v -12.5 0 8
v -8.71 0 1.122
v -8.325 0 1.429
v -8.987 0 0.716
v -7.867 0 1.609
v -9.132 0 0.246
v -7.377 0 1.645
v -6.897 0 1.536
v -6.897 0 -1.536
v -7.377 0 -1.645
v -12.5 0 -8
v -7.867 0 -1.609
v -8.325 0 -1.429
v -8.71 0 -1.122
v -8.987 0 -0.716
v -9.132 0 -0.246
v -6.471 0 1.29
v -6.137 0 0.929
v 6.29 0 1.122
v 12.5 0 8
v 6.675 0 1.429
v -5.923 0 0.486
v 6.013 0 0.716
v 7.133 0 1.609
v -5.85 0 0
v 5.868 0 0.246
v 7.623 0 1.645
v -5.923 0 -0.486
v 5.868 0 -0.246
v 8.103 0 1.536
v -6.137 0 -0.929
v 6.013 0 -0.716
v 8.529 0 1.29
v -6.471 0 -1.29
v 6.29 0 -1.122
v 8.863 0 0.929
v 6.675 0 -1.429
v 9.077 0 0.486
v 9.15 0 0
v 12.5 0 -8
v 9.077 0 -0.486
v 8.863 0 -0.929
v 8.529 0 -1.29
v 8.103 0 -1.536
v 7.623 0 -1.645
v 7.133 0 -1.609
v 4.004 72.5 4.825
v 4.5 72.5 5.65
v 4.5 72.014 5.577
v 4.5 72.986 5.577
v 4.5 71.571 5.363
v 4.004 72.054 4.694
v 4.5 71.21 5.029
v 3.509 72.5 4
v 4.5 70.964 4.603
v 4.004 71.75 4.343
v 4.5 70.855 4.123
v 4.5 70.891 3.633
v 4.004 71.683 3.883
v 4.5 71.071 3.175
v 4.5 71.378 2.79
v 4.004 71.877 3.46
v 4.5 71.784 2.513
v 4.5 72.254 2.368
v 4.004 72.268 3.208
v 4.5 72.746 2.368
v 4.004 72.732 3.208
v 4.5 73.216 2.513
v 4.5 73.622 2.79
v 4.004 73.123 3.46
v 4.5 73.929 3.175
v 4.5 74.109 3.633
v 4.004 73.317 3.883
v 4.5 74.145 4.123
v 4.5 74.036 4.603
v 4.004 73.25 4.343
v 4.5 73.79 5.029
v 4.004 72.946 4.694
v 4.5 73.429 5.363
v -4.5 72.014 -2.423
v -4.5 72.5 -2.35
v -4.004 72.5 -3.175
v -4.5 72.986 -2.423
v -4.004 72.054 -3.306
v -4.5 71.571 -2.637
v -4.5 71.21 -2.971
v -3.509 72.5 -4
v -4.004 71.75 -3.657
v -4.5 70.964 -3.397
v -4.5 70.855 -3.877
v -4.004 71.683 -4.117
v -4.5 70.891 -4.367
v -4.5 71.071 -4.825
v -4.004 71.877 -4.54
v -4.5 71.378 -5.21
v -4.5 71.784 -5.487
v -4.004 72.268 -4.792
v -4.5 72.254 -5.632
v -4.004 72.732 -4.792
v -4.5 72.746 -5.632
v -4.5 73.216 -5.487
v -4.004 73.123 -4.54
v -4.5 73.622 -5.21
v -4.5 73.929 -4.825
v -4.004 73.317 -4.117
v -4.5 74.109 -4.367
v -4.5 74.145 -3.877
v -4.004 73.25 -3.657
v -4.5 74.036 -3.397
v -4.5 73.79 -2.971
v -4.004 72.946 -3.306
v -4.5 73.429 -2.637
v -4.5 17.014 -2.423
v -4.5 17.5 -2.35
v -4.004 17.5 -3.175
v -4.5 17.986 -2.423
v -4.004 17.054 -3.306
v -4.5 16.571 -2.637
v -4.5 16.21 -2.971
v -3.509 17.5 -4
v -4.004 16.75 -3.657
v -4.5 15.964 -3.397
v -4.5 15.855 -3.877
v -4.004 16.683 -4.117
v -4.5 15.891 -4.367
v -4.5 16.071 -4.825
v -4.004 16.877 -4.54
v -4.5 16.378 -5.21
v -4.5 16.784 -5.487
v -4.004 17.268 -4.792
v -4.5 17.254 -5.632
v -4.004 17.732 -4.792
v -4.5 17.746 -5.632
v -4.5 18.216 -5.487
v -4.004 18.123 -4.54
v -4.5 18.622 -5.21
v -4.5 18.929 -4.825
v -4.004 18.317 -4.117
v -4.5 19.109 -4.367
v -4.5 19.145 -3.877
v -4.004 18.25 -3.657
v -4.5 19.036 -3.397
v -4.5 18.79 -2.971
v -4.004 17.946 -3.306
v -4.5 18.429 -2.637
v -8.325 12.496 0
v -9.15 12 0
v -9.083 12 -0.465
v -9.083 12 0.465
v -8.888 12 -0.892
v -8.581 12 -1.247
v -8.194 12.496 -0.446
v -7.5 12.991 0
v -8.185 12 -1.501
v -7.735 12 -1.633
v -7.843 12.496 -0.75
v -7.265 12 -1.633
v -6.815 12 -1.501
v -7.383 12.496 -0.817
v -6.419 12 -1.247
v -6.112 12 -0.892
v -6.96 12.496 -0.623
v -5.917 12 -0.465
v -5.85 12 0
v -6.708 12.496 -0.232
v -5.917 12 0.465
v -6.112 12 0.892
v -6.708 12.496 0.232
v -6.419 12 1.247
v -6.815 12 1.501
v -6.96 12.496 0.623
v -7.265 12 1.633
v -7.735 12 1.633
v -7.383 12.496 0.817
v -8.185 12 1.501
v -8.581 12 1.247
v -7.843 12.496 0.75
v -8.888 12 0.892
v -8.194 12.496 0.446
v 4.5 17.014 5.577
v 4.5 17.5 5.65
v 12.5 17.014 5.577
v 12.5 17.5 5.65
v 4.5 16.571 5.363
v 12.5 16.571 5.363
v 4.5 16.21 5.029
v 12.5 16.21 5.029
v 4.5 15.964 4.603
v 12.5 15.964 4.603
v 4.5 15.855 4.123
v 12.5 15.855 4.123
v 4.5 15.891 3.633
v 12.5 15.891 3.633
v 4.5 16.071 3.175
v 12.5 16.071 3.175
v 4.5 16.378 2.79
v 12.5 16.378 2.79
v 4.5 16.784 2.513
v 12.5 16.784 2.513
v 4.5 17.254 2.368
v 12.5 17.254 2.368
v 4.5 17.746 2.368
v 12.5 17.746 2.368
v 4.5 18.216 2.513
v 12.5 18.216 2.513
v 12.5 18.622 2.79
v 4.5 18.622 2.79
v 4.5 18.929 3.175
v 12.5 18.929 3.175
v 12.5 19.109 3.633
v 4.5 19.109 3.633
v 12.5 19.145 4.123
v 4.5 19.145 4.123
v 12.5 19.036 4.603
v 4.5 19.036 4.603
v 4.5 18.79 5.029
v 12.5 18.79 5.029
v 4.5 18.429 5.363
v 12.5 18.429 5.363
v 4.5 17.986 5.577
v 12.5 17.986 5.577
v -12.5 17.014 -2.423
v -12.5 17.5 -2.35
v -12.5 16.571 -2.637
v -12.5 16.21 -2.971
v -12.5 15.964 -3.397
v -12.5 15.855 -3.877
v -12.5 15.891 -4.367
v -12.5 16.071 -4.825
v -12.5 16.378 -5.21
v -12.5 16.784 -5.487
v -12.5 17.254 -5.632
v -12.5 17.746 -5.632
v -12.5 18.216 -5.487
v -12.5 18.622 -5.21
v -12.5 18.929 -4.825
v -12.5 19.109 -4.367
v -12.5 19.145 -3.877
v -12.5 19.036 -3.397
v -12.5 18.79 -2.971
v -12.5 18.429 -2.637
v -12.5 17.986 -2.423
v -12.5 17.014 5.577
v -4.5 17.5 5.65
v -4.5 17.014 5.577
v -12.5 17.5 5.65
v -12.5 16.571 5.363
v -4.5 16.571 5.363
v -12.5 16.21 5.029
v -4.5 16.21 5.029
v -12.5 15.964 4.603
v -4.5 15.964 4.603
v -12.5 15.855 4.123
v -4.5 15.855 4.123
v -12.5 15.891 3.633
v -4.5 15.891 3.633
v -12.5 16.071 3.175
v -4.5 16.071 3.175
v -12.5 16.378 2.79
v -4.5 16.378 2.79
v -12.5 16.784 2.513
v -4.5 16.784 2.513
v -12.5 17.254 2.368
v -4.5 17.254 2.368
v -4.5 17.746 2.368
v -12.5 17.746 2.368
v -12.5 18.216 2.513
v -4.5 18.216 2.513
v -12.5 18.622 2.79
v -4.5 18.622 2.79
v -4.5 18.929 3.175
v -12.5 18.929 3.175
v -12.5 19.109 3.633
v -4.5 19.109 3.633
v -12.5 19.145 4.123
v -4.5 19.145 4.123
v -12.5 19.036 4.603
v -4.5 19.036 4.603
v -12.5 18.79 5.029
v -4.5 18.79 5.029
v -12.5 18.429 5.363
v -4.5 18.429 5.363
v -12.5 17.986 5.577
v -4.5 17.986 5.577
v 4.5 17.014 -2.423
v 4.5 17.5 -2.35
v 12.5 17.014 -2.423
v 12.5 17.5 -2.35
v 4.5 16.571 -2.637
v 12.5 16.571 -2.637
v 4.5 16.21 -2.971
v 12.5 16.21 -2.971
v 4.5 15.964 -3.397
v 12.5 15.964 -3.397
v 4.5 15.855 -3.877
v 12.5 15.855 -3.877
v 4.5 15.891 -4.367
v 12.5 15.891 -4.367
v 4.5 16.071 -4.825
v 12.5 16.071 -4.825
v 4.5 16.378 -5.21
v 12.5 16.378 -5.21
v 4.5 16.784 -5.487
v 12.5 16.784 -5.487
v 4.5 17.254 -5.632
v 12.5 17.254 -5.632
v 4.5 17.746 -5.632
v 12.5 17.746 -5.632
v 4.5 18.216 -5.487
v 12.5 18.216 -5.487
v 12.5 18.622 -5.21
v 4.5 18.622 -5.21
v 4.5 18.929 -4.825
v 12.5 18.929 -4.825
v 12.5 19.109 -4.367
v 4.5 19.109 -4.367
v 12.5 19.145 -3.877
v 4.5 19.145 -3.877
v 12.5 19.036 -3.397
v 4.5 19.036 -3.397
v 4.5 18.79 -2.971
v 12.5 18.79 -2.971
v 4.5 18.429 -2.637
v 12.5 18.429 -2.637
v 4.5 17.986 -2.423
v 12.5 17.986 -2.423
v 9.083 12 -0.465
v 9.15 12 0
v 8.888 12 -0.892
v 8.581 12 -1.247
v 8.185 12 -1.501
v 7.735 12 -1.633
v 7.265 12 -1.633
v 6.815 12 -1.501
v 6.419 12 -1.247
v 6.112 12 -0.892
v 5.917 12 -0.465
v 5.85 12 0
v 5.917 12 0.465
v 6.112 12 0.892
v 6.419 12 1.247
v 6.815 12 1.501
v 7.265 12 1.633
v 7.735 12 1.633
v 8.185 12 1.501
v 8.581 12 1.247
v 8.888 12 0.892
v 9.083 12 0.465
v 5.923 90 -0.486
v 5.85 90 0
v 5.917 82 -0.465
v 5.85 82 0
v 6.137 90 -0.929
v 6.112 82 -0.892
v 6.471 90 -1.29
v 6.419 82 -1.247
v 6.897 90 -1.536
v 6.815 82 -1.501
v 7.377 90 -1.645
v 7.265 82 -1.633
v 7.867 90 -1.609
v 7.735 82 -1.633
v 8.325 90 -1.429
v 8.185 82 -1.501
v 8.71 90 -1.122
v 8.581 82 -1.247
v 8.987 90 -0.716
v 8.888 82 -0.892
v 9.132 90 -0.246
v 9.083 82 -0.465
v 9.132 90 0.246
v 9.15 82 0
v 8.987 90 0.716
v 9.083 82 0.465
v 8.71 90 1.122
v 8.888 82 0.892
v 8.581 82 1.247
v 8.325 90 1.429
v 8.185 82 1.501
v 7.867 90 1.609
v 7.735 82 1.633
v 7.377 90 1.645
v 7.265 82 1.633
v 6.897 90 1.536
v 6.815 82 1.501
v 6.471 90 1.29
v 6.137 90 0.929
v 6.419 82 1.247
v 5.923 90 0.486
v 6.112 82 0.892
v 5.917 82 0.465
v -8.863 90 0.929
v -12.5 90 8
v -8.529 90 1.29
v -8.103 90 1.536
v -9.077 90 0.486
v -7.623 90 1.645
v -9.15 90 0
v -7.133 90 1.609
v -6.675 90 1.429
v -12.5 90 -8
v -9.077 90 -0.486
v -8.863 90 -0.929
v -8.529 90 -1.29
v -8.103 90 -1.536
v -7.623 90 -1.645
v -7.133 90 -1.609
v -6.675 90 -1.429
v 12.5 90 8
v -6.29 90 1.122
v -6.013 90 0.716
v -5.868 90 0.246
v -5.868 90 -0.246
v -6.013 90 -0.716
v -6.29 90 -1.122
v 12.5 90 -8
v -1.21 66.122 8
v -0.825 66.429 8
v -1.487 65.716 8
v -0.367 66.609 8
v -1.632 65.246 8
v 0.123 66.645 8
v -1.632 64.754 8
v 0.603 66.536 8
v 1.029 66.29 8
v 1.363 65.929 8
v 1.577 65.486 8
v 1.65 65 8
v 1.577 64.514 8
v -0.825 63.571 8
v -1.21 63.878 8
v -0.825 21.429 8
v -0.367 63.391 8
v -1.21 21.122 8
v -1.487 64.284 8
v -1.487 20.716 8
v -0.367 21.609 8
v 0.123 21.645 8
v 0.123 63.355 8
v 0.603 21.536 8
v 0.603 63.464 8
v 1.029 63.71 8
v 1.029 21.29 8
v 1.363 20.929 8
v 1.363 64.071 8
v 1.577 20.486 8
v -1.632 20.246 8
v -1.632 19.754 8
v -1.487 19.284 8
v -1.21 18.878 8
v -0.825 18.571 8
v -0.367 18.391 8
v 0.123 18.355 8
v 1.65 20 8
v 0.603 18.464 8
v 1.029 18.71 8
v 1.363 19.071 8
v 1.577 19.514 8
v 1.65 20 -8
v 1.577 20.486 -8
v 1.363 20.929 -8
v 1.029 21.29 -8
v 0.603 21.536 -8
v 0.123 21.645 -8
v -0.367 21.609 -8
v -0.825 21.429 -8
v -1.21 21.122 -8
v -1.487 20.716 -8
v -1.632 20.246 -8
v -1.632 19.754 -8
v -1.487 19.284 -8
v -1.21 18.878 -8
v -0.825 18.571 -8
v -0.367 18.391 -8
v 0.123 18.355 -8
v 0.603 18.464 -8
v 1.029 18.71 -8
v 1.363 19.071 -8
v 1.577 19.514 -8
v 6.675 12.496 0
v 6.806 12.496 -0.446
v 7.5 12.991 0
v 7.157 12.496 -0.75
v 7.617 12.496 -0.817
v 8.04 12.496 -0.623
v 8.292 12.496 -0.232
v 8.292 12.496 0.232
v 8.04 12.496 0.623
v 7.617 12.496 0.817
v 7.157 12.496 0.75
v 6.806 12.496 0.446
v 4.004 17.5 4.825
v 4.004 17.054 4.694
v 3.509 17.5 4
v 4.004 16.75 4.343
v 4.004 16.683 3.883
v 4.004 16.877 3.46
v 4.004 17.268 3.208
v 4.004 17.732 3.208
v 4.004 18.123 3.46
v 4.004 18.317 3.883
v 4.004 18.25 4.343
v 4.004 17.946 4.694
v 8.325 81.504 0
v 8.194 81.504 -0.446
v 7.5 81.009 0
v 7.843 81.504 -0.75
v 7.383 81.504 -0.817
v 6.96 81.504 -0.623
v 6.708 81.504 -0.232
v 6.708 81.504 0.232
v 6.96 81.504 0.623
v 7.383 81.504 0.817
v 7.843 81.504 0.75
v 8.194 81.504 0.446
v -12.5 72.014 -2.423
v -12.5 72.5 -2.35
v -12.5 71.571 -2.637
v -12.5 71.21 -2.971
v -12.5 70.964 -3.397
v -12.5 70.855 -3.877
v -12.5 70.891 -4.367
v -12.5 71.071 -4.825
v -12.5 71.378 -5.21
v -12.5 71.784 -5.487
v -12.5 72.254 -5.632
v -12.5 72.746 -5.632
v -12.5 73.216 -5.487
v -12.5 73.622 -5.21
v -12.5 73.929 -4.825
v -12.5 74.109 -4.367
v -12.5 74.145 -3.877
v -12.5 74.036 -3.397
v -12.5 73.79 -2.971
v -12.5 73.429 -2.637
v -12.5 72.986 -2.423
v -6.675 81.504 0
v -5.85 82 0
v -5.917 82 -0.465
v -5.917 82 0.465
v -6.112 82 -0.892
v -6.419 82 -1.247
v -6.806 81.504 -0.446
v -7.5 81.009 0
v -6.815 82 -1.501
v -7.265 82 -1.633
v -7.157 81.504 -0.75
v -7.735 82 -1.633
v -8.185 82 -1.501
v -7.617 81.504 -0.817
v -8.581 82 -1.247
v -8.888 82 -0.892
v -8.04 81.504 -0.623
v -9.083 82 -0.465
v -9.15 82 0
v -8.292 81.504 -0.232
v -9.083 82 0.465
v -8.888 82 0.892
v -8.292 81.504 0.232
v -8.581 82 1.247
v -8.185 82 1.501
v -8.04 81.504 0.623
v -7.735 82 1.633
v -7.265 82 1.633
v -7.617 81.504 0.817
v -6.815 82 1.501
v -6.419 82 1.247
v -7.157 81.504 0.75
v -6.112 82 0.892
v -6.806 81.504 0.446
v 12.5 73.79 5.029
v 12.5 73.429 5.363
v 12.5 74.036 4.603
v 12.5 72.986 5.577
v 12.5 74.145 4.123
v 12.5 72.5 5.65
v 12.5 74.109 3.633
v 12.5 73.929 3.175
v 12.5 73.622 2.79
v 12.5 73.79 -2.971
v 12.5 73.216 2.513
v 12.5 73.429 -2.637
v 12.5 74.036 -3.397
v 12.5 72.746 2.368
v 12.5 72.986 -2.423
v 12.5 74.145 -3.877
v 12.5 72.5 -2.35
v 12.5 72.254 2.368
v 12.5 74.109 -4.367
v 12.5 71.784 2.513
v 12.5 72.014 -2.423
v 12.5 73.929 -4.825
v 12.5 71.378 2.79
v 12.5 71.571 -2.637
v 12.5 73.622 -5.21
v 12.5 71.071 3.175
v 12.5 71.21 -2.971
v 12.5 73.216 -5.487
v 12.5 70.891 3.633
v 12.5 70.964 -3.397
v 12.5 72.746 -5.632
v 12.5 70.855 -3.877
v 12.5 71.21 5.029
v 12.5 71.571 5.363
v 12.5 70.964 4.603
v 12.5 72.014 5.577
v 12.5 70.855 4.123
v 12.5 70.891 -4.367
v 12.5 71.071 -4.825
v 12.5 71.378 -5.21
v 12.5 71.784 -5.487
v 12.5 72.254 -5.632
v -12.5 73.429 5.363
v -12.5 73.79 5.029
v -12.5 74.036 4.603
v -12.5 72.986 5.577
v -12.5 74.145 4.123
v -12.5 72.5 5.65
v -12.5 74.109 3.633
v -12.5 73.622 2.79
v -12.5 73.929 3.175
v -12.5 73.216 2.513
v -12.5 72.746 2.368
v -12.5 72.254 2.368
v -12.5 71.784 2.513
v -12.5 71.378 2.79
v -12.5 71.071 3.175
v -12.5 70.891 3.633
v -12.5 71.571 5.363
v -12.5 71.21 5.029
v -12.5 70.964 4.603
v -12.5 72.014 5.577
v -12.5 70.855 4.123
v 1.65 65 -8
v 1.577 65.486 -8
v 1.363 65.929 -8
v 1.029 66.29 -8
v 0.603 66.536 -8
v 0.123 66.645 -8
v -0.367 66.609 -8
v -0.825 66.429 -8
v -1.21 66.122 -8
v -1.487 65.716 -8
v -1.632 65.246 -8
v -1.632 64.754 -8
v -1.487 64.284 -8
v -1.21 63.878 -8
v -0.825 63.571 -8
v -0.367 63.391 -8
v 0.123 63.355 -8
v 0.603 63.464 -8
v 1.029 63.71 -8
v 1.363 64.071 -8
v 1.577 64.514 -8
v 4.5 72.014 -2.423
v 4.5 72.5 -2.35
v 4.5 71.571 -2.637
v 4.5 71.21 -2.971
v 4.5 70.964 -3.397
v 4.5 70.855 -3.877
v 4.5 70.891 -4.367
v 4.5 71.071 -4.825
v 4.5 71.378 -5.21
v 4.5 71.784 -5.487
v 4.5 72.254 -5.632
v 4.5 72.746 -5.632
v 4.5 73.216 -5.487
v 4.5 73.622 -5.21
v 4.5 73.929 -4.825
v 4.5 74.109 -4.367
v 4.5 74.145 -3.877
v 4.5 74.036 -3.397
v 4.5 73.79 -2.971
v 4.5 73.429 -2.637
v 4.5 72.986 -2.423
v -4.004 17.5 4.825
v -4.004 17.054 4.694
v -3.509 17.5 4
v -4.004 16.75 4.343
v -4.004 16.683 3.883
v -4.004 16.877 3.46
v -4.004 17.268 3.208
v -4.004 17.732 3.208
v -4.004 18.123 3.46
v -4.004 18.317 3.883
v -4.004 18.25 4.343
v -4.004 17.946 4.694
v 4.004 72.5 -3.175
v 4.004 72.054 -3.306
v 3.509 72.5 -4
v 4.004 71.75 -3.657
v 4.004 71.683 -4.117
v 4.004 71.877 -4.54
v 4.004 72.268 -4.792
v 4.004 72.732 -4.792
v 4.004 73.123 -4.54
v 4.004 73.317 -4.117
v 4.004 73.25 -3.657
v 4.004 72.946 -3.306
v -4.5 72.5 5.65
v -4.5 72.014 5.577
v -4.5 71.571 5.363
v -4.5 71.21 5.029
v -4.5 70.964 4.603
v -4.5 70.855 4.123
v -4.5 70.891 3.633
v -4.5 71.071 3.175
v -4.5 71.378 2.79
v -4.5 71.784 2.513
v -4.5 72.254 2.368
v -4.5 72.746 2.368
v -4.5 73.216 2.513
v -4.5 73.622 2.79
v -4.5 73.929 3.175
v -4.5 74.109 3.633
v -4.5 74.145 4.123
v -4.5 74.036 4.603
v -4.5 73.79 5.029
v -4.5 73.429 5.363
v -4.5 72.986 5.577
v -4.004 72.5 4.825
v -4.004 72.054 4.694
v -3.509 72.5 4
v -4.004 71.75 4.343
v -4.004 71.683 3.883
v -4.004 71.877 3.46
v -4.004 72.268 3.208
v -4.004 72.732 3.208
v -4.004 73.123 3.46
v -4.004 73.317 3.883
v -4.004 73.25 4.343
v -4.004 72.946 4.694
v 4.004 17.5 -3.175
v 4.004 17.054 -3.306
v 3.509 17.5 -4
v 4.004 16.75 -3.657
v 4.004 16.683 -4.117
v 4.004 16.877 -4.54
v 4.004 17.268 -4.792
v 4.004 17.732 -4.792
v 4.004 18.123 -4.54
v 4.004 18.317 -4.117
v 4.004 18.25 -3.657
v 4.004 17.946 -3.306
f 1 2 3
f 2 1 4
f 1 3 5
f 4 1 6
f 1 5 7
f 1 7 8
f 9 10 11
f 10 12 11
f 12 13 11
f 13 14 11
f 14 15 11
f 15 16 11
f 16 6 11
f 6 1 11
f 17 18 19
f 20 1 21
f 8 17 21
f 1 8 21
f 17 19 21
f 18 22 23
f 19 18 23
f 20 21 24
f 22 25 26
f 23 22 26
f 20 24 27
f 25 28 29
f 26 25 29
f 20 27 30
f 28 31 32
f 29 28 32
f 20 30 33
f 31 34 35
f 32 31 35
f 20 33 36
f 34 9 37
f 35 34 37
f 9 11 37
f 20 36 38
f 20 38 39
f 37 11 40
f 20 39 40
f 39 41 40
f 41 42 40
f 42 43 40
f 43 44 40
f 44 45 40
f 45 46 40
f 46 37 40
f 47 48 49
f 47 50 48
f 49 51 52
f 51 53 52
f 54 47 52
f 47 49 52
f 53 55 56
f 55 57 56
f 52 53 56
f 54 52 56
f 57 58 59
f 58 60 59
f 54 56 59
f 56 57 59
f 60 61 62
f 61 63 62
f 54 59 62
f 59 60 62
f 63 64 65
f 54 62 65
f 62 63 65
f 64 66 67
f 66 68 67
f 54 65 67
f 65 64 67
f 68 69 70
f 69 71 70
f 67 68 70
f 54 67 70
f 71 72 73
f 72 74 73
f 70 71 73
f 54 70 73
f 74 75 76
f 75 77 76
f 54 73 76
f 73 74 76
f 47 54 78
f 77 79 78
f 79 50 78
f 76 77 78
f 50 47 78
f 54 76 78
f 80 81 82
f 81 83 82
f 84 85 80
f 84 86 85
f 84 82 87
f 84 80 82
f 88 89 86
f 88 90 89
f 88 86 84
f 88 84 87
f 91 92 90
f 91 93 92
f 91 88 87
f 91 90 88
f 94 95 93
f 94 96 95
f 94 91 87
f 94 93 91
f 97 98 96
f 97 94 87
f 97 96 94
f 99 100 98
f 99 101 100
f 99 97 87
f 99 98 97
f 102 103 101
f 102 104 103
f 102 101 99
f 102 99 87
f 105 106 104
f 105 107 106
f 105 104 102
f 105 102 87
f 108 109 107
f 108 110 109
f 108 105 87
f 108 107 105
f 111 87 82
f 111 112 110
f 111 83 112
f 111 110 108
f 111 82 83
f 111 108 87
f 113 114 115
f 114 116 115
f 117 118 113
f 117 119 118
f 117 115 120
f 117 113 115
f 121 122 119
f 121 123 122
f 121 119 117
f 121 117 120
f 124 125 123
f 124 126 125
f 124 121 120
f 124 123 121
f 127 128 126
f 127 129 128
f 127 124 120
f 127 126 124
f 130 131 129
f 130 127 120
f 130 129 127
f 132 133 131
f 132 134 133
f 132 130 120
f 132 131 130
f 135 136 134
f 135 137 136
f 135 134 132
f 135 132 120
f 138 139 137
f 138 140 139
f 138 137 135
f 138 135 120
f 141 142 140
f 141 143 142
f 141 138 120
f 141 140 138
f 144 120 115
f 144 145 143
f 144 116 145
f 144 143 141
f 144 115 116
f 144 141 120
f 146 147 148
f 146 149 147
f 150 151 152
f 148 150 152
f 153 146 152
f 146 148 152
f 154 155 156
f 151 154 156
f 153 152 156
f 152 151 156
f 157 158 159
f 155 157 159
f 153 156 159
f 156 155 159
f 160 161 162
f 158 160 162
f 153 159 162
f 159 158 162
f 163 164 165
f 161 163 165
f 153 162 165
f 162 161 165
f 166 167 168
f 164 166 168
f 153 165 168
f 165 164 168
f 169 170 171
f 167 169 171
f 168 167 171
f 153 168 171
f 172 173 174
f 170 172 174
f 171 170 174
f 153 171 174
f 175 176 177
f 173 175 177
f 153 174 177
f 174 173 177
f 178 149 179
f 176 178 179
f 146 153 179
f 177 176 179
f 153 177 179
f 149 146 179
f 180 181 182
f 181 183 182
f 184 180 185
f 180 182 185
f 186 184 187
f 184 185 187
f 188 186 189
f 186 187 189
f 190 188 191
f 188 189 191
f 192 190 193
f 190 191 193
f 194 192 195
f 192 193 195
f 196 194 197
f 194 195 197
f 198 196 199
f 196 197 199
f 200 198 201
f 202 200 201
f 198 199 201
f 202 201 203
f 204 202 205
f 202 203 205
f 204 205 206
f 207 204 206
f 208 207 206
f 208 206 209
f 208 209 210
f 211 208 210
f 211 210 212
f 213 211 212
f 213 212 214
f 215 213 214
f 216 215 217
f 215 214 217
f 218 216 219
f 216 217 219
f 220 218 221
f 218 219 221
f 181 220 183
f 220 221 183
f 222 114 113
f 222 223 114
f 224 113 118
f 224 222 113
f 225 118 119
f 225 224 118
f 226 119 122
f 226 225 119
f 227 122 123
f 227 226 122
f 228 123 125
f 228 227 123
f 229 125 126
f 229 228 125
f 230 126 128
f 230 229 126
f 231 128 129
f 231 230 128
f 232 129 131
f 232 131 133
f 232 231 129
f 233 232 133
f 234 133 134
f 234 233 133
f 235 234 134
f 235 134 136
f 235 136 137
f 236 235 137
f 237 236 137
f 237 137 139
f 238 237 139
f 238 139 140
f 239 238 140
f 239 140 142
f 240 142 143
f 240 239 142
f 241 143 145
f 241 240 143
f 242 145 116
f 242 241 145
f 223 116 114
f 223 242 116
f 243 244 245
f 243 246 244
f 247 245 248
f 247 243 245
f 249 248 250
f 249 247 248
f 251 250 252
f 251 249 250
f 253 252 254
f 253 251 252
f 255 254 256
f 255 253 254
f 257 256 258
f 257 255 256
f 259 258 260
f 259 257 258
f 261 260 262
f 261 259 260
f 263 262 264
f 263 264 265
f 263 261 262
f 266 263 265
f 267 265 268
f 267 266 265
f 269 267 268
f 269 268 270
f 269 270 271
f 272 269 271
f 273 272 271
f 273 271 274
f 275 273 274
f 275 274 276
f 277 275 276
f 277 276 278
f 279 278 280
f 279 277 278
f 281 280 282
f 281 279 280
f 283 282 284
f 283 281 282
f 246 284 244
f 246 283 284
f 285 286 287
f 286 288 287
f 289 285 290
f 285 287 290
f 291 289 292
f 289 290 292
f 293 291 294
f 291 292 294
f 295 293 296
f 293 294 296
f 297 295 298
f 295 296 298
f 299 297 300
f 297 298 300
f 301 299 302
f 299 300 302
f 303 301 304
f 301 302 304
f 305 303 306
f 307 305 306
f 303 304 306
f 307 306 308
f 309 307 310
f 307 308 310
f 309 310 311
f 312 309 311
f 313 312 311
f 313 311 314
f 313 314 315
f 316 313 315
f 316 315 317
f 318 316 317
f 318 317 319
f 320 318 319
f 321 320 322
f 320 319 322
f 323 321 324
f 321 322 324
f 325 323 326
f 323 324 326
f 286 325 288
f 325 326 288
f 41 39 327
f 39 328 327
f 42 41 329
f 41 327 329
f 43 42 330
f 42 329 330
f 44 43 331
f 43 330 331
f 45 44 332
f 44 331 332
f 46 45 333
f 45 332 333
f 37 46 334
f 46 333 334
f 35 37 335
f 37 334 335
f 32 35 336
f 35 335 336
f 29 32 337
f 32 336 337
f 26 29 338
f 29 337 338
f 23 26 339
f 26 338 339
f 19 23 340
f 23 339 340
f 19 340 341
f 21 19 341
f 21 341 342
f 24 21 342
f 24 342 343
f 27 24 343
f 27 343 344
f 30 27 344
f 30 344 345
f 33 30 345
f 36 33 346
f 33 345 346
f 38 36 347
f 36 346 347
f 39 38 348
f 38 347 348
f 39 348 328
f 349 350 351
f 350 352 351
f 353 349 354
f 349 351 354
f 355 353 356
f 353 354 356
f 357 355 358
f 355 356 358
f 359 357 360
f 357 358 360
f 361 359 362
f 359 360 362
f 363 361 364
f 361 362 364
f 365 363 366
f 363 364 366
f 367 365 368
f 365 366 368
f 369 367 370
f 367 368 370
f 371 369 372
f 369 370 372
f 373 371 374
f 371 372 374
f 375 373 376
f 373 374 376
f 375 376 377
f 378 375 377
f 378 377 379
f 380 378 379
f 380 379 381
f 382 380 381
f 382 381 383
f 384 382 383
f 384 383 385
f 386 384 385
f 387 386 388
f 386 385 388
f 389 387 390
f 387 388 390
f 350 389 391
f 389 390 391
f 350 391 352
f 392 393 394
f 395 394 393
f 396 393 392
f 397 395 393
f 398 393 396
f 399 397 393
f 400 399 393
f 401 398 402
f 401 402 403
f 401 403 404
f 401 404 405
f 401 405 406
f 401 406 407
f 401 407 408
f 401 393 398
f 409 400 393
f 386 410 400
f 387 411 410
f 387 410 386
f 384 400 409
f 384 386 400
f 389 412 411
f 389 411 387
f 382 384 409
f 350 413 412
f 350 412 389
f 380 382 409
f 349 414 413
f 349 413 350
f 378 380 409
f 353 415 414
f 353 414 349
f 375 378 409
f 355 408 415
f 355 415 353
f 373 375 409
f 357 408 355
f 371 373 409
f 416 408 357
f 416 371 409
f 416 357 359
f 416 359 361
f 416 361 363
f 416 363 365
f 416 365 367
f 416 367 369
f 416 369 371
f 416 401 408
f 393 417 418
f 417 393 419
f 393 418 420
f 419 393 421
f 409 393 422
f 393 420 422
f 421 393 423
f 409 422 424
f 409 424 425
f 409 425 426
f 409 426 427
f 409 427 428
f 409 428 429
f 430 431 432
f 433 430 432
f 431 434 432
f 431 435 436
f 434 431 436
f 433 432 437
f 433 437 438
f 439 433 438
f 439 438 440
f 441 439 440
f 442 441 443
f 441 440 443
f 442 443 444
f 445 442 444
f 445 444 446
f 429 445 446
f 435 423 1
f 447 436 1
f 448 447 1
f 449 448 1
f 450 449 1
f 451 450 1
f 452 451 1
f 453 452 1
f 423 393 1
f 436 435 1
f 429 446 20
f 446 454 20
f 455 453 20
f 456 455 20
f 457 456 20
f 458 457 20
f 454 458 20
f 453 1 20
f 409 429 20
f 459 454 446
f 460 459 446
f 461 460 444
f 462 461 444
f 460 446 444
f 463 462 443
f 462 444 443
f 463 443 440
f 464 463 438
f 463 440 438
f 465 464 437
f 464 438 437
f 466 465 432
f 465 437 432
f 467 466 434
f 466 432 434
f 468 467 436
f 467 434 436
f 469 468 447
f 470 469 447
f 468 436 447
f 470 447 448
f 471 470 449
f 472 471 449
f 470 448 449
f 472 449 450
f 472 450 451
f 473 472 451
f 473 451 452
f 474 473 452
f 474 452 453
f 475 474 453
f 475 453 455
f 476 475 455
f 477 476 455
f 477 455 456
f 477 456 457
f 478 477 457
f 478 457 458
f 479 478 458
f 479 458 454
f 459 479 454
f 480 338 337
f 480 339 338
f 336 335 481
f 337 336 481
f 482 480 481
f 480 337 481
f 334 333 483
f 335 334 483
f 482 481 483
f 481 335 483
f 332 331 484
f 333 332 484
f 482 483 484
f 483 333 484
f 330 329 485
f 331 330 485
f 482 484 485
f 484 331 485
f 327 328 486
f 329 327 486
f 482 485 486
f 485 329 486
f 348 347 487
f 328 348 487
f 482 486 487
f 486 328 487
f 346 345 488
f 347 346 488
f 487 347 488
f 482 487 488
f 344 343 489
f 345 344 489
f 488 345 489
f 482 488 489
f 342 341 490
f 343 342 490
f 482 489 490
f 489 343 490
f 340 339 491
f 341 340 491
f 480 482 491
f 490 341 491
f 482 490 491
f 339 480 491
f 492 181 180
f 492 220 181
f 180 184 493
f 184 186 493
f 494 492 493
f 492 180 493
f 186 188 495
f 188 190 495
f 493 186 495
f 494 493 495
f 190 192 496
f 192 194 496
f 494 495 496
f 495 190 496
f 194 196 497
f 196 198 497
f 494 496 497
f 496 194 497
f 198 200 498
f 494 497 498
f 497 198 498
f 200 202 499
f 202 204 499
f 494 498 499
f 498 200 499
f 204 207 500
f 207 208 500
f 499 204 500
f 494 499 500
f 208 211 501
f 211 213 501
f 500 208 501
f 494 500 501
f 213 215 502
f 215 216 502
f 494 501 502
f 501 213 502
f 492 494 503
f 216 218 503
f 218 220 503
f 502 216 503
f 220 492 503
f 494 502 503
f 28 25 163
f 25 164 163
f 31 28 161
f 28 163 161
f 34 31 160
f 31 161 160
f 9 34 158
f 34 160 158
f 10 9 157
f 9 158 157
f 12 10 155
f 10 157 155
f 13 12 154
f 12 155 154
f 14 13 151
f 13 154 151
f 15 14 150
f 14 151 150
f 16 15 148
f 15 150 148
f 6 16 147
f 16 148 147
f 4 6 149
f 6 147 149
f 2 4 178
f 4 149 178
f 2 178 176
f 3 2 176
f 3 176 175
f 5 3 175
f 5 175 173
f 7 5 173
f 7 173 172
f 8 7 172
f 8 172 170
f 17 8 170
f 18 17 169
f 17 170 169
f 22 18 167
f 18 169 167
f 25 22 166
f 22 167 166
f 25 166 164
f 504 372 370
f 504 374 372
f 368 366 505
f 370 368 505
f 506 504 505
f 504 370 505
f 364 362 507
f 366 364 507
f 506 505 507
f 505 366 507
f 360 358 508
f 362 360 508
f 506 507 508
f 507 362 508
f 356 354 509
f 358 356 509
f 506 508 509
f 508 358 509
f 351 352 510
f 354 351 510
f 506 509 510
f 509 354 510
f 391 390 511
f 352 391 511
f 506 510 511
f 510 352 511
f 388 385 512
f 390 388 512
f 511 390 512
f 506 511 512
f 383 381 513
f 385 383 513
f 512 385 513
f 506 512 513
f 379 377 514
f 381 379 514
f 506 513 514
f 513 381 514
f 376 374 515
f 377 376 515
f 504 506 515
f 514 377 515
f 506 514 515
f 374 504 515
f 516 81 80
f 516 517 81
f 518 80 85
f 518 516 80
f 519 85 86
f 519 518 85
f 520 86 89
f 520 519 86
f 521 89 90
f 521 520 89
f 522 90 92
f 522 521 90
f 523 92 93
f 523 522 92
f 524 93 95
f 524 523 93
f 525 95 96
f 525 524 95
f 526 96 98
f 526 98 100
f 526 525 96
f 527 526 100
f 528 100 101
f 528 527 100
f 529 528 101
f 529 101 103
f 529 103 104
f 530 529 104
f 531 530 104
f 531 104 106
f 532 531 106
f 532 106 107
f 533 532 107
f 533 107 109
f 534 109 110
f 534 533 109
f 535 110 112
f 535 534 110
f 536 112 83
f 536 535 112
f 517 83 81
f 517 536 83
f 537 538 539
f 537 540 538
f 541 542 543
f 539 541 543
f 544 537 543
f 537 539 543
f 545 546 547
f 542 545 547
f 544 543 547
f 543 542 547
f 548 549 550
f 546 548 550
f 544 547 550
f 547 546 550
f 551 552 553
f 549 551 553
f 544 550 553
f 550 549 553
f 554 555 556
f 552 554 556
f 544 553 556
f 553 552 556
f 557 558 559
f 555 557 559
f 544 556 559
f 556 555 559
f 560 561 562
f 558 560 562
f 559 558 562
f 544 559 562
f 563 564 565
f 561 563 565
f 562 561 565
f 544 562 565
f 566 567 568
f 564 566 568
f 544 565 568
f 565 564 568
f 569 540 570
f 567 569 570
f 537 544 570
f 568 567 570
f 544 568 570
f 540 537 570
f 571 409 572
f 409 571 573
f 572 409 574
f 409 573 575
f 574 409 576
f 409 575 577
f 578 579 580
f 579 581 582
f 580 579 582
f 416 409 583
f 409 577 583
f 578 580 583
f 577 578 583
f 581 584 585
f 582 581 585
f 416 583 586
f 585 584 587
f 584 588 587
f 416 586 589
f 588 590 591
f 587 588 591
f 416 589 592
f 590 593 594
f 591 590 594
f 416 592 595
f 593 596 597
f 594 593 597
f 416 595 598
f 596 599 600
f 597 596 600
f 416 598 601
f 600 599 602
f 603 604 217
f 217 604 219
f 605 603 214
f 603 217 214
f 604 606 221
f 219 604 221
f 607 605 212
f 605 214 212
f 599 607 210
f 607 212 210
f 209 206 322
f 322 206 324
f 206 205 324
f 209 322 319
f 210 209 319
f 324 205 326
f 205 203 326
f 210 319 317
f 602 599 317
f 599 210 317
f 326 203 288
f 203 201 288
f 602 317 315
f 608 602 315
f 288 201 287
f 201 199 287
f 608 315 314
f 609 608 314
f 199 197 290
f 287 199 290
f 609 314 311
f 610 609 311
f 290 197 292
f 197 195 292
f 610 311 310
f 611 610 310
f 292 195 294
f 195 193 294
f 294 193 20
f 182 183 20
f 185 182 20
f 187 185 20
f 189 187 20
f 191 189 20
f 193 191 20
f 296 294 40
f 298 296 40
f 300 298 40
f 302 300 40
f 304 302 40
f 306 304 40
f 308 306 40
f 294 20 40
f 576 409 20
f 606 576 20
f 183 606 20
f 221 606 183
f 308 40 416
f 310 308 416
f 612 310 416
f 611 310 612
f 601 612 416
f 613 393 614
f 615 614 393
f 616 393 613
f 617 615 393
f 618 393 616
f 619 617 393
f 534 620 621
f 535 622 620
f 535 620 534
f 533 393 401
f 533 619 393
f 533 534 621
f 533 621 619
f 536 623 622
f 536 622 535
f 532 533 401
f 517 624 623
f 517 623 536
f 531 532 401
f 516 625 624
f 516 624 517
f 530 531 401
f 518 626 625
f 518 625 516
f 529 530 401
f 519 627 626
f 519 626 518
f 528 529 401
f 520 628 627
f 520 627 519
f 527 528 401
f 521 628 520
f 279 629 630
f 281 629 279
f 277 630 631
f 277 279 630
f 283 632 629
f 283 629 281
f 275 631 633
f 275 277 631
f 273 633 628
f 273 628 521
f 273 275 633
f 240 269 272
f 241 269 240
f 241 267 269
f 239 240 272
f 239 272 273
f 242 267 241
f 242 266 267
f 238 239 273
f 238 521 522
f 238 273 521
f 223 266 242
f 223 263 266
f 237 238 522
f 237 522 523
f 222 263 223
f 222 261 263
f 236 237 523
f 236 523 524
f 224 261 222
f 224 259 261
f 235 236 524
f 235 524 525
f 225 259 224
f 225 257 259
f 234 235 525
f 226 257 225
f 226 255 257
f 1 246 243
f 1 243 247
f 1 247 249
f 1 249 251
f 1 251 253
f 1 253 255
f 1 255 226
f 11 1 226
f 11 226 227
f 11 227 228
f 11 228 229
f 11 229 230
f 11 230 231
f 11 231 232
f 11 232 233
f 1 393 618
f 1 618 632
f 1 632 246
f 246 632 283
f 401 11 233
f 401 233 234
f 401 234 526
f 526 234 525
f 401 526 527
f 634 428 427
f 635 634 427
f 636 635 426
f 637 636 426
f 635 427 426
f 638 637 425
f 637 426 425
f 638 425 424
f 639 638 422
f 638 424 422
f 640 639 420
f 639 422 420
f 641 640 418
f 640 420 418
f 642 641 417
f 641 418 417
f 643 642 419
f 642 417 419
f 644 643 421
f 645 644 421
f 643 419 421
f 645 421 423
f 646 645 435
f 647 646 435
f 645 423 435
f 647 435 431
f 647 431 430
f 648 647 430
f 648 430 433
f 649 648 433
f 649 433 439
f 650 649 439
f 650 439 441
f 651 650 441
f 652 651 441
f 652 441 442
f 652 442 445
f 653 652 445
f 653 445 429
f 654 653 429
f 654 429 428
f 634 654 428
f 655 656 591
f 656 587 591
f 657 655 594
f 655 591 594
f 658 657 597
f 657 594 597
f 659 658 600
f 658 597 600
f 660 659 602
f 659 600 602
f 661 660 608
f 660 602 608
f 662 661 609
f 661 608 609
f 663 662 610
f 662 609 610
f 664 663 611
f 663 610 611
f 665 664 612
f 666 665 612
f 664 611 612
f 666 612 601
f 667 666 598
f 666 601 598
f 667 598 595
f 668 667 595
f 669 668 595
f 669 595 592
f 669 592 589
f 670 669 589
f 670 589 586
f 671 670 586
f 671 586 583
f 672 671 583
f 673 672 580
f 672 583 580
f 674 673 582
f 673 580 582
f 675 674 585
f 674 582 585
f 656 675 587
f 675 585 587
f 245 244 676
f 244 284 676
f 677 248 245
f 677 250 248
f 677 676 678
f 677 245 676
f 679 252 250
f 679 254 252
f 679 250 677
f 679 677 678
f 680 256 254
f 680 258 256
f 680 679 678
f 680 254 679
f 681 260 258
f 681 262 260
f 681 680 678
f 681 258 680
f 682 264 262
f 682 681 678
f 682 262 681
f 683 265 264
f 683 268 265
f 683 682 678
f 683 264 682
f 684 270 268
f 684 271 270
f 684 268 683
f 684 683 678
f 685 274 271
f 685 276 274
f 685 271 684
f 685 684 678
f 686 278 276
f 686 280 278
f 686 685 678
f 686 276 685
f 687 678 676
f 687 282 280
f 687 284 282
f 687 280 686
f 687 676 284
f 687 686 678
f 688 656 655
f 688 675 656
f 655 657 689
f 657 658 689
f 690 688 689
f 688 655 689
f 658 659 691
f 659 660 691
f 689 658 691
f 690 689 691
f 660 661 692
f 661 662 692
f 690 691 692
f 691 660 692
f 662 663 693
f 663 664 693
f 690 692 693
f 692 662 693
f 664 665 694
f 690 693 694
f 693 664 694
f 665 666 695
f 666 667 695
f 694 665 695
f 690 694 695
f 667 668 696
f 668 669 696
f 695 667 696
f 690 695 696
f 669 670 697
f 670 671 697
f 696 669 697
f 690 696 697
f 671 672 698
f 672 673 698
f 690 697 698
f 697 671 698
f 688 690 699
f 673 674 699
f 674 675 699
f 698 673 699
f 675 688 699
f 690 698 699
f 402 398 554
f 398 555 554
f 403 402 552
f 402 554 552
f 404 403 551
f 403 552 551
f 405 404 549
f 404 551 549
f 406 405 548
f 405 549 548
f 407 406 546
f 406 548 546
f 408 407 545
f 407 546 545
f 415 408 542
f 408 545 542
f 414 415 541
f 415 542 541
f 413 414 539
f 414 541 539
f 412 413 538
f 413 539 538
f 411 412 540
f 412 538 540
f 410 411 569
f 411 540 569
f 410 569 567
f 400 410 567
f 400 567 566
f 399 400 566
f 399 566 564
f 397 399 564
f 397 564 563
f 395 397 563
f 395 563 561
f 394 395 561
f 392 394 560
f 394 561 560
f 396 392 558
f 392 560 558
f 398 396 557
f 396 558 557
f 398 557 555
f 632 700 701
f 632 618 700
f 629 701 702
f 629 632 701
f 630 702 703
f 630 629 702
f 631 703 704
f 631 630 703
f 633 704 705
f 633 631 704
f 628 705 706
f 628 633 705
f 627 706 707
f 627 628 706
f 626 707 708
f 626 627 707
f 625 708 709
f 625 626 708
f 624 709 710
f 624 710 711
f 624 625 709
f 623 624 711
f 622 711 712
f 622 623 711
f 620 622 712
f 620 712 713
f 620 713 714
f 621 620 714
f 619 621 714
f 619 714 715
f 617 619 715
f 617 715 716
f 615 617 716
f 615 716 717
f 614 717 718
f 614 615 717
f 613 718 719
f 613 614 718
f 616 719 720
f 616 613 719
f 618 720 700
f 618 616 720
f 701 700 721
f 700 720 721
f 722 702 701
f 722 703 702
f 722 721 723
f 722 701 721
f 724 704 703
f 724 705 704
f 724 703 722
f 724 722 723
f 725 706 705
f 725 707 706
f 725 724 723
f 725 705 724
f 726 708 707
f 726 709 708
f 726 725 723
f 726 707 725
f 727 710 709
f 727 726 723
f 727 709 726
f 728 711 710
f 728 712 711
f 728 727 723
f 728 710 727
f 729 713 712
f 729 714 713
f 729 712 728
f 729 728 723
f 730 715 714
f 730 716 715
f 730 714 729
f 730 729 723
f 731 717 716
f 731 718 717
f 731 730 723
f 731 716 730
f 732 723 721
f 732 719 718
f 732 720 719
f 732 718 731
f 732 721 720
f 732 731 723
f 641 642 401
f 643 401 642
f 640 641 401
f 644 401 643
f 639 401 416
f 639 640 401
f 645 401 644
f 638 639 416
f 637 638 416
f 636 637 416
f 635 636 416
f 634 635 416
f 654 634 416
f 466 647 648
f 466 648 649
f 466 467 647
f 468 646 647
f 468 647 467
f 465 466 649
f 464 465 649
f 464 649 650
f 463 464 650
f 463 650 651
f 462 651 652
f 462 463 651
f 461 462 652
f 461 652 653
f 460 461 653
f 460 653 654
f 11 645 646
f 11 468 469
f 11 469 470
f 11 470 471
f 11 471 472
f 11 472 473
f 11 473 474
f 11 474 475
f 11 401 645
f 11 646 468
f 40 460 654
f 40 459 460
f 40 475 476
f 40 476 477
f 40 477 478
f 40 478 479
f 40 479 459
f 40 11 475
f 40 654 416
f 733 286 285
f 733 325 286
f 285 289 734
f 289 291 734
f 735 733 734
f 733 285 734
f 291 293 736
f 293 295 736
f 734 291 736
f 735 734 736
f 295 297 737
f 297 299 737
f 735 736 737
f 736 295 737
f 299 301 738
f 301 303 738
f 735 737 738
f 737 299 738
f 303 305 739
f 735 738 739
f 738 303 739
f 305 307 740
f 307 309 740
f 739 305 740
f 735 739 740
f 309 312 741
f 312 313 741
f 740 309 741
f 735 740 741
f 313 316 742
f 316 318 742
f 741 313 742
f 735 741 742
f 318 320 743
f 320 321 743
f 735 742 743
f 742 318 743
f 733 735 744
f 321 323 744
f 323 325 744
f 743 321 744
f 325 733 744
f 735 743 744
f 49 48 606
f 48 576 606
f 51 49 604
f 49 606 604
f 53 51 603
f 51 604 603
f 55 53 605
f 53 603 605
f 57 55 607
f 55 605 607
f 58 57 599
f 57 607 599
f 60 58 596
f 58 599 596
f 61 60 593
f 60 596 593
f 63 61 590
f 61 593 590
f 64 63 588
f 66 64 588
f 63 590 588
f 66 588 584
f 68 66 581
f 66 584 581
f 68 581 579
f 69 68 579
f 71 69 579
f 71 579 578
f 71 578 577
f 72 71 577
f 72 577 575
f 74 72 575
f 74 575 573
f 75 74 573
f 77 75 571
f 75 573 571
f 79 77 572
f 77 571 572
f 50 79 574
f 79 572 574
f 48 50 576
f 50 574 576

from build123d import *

# Parameters (mm, degrees)
SKETCH1_W                      = 25
SKETCH1_H                      = 16
BOSS_EXTRUDE1_DEPTH            = 90
M4X0_7_TAPPED_HOLE1_D          = 3.3
M4X0_7_TAPPED_HOLE1_DEPTH      = 8
M4X0_7_TAPPED_HOLE1_TIP        = 0.991420021
M4X0_7_TAPPED_HOLE2_D          = 3.3
M4X0_7_TAPPED_HOLE2_DEPTH      = 12
M4X0_7_TAPPED_HOLE2_TIP        = 0.991420021
M4X0_7_TAPPED_HOLE3_D          = 3.3
M4X0_7_TAPPED_HOLE4_AT_2_COUNT = 2
M4X0_7_TAPPED_HOLE4_AT_2_PITCH = 55.578772926
M4X0_7_TAPPED_HOLE4_AT_3_COUNT = 2
M4X0_7_TAPPED_HOLE4_AT_3_PITCH = 55
M4X0_7_TAPPED_HOLE4_AT_4_COUNT = 2
M4X0_7_TAPPED_HOLE4_AT_4_PITCH = 8


with BuildPart() as part:
    # Sketch1 → Boss-Extrude1 (new body)
    with BuildSketch(Plane(origin=(0, 0, 0), x_dir=(1, 0, 0), z_dir=(0, 1, 0))):
        Rectangle(SKETCH1_W, SKETCH1_H)
    extrude(amount=BOSS_EXTRUDE1_DEPTH)

    # M4x0.7 Tapped Hole1
    with Locations(Plane(origin=(0, 90, 0), x_dir=(1, 0, 0), z_dir=(0, 1, 0))):
        with Locations((-7.5, 0), (7.5, 0)):
            Hole(M4X0_7_TAPPED_HOLE1_D / 2, depth=M4X0_7_TAPPED_HOLE1_DEPTH)
            with Locations((0, 0, -(M4X0_7_TAPPED_HOLE1_DEPTH + M4X0_7_TAPPED_HOLE1_TIP / 2))):  # 118° drill point
                Cone(0, M4X0_7_TAPPED_HOLE1_D / 2, M4X0_7_TAPPED_HOLE1_TIP, mode=Mode.SUBTRACT)

    # M4x0.7 Tapped Hole2
    with Locations(Plane(origin=(0, 0, 0), x_dir=(-1, 0, 0), z_dir=(0, -1, 0))):
        with Locations((-7.5, 0), (7.5, 0)):
            Hole(M4X0_7_TAPPED_HOLE2_D / 2, depth=M4X0_7_TAPPED_HOLE2_DEPTH)
            with Locations((0, 0, -(M4X0_7_TAPPED_HOLE2_DEPTH + M4X0_7_TAPPED_HOLE2_TIP / 2))):  # 118° drill point
                Cone(0, M4X0_7_TAPPED_HOLE2_D / 2, M4X0_7_TAPPED_HOLE2_TIP, mode=Mode.SUBTRACT)

    # M4x0.7 Tapped Hole3 (through all)
    with Locations(Plane(origin=(0, 0, -8), x_dir=(-1, 0, 0), z_dir=(0, 0, -1))):
        with Locations((0, 20), (0, 65), (15, 65), (15, 20)):
            Hole(M4X0_7_TAPPED_HOLE3_D / 2)

    # Sketch13 → M4x0.7 Tapped Hole4 (revolve, cut)
    with BuildSketch(Plane(origin=(-12.5, 17.5, 4), x_dir=(0, 0, 1), z_dir=(0, 1, 0))):
        Polygon((0, 0), (0, 8.991420021), (1.65, 8), (1.65, 0), align=None)
    m4x0_7_tapped_hole4 = revolve(axis=Axis((-18.85, 17.5, 4), (1, 0, 0)), mode=Mode.SUBTRACT)

    # M4x0.7 Tapped Hole4 at 2: M4x0.7 Tapped Hole4 ×2
    with Locations(*[Vector(0, 0.9895864392845114, -0.14393984571411075) * (i * M4X0_7_TAPPED_HOLE4_AT_2_PITCH) for i in range(1, M4X0_7_TAPPED_HOLE4_AT_2_COUNT)]):
        add(m4x0_7_tapped_hole4, mode=Mode.SUBTRACT)

    # M4x0.7 Tapped Hole4 at 3: M4x0.7 Tapped Hole4 ×2
    with Locations(*[(0, i * M4X0_7_TAPPED_HOLE4_AT_3_PITCH, 0) for i in range(1, M4X0_7_TAPPED_HOLE4_AT_3_COUNT)]):
        add(m4x0_7_tapped_hole4, mode=Mode.SUBTRACT)

    # M4x0.7 Tapped Hole4 at 4: M4x0.7 Tapped Hole4 ×2
    with Locations(*[(0, 0, -i * M4X0_7_TAPPED_HOLE4_AT_4_PITCH) for i in range(1, M4X0_7_TAPPED_HOLE4_AT_4_COUNT)]):
        add(m4x0_7_tapped_hole4, mode=Mode.SUBTRACT)

    # Mirror1: M4x0.7 Tapped Hole4 across plane
    add(m4x0_7_tapped_hole4.mirror(Plane(origin=(0, 0, 0), x_dir=(0, 0, 1), z_dir=(1, 0, 0))), mode=Mode.SUBTRACT)

    # Mirror1 copy 1 sketch → Mirror1 copy 1 (revolve, cut)
    with BuildSketch(Plane(origin=(12.5, 72.5, -4), x_dir=(0, 0, 1), z_dir=(0, 1, 0))):
        Polygon((0, 0), (0, -8.991420021), (1.65, -8), (1.65, 0), align=None)
    revolve(axis=Axis((18.85, 72.5, -4), (1, 0, 0)), mode=Mode.SUBTRACT)

    # Mirror1 copy 2 sketch → Mirror1 copy 2 (revolve, cut)
    with BuildSketch(Plane(origin=(12.5, 72.5, 4), x_dir=(0, 0, 1), z_dir=(0, 1, 0))):
        Polygon((0, 0), (0, -8.991420021), (1.65, -8), (1.65, 0), align=None)
    revolve(axis=Axis((18.85, 72.5, 4), (1, 0, 0)), mode=Mode.SUBTRACT)

    # Mirror1 copy 3 sketch → Mirror1 copy 3 (revolve, cut)
    with BuildSketch(Plane(origin=(12.5, 17.5, -4), x_dir=(0, 0, 1), z_dir=(0, 1, 0))):
        Polygon((0, 0), (0, -8.991420021), (1.65, -8), (1.65, 0), align=None)
    revolve(axis=Axis((18.85, 17.5, -4), (1, 0, 0)), mode=Mode.SUBTRACT)


solid = part.part
